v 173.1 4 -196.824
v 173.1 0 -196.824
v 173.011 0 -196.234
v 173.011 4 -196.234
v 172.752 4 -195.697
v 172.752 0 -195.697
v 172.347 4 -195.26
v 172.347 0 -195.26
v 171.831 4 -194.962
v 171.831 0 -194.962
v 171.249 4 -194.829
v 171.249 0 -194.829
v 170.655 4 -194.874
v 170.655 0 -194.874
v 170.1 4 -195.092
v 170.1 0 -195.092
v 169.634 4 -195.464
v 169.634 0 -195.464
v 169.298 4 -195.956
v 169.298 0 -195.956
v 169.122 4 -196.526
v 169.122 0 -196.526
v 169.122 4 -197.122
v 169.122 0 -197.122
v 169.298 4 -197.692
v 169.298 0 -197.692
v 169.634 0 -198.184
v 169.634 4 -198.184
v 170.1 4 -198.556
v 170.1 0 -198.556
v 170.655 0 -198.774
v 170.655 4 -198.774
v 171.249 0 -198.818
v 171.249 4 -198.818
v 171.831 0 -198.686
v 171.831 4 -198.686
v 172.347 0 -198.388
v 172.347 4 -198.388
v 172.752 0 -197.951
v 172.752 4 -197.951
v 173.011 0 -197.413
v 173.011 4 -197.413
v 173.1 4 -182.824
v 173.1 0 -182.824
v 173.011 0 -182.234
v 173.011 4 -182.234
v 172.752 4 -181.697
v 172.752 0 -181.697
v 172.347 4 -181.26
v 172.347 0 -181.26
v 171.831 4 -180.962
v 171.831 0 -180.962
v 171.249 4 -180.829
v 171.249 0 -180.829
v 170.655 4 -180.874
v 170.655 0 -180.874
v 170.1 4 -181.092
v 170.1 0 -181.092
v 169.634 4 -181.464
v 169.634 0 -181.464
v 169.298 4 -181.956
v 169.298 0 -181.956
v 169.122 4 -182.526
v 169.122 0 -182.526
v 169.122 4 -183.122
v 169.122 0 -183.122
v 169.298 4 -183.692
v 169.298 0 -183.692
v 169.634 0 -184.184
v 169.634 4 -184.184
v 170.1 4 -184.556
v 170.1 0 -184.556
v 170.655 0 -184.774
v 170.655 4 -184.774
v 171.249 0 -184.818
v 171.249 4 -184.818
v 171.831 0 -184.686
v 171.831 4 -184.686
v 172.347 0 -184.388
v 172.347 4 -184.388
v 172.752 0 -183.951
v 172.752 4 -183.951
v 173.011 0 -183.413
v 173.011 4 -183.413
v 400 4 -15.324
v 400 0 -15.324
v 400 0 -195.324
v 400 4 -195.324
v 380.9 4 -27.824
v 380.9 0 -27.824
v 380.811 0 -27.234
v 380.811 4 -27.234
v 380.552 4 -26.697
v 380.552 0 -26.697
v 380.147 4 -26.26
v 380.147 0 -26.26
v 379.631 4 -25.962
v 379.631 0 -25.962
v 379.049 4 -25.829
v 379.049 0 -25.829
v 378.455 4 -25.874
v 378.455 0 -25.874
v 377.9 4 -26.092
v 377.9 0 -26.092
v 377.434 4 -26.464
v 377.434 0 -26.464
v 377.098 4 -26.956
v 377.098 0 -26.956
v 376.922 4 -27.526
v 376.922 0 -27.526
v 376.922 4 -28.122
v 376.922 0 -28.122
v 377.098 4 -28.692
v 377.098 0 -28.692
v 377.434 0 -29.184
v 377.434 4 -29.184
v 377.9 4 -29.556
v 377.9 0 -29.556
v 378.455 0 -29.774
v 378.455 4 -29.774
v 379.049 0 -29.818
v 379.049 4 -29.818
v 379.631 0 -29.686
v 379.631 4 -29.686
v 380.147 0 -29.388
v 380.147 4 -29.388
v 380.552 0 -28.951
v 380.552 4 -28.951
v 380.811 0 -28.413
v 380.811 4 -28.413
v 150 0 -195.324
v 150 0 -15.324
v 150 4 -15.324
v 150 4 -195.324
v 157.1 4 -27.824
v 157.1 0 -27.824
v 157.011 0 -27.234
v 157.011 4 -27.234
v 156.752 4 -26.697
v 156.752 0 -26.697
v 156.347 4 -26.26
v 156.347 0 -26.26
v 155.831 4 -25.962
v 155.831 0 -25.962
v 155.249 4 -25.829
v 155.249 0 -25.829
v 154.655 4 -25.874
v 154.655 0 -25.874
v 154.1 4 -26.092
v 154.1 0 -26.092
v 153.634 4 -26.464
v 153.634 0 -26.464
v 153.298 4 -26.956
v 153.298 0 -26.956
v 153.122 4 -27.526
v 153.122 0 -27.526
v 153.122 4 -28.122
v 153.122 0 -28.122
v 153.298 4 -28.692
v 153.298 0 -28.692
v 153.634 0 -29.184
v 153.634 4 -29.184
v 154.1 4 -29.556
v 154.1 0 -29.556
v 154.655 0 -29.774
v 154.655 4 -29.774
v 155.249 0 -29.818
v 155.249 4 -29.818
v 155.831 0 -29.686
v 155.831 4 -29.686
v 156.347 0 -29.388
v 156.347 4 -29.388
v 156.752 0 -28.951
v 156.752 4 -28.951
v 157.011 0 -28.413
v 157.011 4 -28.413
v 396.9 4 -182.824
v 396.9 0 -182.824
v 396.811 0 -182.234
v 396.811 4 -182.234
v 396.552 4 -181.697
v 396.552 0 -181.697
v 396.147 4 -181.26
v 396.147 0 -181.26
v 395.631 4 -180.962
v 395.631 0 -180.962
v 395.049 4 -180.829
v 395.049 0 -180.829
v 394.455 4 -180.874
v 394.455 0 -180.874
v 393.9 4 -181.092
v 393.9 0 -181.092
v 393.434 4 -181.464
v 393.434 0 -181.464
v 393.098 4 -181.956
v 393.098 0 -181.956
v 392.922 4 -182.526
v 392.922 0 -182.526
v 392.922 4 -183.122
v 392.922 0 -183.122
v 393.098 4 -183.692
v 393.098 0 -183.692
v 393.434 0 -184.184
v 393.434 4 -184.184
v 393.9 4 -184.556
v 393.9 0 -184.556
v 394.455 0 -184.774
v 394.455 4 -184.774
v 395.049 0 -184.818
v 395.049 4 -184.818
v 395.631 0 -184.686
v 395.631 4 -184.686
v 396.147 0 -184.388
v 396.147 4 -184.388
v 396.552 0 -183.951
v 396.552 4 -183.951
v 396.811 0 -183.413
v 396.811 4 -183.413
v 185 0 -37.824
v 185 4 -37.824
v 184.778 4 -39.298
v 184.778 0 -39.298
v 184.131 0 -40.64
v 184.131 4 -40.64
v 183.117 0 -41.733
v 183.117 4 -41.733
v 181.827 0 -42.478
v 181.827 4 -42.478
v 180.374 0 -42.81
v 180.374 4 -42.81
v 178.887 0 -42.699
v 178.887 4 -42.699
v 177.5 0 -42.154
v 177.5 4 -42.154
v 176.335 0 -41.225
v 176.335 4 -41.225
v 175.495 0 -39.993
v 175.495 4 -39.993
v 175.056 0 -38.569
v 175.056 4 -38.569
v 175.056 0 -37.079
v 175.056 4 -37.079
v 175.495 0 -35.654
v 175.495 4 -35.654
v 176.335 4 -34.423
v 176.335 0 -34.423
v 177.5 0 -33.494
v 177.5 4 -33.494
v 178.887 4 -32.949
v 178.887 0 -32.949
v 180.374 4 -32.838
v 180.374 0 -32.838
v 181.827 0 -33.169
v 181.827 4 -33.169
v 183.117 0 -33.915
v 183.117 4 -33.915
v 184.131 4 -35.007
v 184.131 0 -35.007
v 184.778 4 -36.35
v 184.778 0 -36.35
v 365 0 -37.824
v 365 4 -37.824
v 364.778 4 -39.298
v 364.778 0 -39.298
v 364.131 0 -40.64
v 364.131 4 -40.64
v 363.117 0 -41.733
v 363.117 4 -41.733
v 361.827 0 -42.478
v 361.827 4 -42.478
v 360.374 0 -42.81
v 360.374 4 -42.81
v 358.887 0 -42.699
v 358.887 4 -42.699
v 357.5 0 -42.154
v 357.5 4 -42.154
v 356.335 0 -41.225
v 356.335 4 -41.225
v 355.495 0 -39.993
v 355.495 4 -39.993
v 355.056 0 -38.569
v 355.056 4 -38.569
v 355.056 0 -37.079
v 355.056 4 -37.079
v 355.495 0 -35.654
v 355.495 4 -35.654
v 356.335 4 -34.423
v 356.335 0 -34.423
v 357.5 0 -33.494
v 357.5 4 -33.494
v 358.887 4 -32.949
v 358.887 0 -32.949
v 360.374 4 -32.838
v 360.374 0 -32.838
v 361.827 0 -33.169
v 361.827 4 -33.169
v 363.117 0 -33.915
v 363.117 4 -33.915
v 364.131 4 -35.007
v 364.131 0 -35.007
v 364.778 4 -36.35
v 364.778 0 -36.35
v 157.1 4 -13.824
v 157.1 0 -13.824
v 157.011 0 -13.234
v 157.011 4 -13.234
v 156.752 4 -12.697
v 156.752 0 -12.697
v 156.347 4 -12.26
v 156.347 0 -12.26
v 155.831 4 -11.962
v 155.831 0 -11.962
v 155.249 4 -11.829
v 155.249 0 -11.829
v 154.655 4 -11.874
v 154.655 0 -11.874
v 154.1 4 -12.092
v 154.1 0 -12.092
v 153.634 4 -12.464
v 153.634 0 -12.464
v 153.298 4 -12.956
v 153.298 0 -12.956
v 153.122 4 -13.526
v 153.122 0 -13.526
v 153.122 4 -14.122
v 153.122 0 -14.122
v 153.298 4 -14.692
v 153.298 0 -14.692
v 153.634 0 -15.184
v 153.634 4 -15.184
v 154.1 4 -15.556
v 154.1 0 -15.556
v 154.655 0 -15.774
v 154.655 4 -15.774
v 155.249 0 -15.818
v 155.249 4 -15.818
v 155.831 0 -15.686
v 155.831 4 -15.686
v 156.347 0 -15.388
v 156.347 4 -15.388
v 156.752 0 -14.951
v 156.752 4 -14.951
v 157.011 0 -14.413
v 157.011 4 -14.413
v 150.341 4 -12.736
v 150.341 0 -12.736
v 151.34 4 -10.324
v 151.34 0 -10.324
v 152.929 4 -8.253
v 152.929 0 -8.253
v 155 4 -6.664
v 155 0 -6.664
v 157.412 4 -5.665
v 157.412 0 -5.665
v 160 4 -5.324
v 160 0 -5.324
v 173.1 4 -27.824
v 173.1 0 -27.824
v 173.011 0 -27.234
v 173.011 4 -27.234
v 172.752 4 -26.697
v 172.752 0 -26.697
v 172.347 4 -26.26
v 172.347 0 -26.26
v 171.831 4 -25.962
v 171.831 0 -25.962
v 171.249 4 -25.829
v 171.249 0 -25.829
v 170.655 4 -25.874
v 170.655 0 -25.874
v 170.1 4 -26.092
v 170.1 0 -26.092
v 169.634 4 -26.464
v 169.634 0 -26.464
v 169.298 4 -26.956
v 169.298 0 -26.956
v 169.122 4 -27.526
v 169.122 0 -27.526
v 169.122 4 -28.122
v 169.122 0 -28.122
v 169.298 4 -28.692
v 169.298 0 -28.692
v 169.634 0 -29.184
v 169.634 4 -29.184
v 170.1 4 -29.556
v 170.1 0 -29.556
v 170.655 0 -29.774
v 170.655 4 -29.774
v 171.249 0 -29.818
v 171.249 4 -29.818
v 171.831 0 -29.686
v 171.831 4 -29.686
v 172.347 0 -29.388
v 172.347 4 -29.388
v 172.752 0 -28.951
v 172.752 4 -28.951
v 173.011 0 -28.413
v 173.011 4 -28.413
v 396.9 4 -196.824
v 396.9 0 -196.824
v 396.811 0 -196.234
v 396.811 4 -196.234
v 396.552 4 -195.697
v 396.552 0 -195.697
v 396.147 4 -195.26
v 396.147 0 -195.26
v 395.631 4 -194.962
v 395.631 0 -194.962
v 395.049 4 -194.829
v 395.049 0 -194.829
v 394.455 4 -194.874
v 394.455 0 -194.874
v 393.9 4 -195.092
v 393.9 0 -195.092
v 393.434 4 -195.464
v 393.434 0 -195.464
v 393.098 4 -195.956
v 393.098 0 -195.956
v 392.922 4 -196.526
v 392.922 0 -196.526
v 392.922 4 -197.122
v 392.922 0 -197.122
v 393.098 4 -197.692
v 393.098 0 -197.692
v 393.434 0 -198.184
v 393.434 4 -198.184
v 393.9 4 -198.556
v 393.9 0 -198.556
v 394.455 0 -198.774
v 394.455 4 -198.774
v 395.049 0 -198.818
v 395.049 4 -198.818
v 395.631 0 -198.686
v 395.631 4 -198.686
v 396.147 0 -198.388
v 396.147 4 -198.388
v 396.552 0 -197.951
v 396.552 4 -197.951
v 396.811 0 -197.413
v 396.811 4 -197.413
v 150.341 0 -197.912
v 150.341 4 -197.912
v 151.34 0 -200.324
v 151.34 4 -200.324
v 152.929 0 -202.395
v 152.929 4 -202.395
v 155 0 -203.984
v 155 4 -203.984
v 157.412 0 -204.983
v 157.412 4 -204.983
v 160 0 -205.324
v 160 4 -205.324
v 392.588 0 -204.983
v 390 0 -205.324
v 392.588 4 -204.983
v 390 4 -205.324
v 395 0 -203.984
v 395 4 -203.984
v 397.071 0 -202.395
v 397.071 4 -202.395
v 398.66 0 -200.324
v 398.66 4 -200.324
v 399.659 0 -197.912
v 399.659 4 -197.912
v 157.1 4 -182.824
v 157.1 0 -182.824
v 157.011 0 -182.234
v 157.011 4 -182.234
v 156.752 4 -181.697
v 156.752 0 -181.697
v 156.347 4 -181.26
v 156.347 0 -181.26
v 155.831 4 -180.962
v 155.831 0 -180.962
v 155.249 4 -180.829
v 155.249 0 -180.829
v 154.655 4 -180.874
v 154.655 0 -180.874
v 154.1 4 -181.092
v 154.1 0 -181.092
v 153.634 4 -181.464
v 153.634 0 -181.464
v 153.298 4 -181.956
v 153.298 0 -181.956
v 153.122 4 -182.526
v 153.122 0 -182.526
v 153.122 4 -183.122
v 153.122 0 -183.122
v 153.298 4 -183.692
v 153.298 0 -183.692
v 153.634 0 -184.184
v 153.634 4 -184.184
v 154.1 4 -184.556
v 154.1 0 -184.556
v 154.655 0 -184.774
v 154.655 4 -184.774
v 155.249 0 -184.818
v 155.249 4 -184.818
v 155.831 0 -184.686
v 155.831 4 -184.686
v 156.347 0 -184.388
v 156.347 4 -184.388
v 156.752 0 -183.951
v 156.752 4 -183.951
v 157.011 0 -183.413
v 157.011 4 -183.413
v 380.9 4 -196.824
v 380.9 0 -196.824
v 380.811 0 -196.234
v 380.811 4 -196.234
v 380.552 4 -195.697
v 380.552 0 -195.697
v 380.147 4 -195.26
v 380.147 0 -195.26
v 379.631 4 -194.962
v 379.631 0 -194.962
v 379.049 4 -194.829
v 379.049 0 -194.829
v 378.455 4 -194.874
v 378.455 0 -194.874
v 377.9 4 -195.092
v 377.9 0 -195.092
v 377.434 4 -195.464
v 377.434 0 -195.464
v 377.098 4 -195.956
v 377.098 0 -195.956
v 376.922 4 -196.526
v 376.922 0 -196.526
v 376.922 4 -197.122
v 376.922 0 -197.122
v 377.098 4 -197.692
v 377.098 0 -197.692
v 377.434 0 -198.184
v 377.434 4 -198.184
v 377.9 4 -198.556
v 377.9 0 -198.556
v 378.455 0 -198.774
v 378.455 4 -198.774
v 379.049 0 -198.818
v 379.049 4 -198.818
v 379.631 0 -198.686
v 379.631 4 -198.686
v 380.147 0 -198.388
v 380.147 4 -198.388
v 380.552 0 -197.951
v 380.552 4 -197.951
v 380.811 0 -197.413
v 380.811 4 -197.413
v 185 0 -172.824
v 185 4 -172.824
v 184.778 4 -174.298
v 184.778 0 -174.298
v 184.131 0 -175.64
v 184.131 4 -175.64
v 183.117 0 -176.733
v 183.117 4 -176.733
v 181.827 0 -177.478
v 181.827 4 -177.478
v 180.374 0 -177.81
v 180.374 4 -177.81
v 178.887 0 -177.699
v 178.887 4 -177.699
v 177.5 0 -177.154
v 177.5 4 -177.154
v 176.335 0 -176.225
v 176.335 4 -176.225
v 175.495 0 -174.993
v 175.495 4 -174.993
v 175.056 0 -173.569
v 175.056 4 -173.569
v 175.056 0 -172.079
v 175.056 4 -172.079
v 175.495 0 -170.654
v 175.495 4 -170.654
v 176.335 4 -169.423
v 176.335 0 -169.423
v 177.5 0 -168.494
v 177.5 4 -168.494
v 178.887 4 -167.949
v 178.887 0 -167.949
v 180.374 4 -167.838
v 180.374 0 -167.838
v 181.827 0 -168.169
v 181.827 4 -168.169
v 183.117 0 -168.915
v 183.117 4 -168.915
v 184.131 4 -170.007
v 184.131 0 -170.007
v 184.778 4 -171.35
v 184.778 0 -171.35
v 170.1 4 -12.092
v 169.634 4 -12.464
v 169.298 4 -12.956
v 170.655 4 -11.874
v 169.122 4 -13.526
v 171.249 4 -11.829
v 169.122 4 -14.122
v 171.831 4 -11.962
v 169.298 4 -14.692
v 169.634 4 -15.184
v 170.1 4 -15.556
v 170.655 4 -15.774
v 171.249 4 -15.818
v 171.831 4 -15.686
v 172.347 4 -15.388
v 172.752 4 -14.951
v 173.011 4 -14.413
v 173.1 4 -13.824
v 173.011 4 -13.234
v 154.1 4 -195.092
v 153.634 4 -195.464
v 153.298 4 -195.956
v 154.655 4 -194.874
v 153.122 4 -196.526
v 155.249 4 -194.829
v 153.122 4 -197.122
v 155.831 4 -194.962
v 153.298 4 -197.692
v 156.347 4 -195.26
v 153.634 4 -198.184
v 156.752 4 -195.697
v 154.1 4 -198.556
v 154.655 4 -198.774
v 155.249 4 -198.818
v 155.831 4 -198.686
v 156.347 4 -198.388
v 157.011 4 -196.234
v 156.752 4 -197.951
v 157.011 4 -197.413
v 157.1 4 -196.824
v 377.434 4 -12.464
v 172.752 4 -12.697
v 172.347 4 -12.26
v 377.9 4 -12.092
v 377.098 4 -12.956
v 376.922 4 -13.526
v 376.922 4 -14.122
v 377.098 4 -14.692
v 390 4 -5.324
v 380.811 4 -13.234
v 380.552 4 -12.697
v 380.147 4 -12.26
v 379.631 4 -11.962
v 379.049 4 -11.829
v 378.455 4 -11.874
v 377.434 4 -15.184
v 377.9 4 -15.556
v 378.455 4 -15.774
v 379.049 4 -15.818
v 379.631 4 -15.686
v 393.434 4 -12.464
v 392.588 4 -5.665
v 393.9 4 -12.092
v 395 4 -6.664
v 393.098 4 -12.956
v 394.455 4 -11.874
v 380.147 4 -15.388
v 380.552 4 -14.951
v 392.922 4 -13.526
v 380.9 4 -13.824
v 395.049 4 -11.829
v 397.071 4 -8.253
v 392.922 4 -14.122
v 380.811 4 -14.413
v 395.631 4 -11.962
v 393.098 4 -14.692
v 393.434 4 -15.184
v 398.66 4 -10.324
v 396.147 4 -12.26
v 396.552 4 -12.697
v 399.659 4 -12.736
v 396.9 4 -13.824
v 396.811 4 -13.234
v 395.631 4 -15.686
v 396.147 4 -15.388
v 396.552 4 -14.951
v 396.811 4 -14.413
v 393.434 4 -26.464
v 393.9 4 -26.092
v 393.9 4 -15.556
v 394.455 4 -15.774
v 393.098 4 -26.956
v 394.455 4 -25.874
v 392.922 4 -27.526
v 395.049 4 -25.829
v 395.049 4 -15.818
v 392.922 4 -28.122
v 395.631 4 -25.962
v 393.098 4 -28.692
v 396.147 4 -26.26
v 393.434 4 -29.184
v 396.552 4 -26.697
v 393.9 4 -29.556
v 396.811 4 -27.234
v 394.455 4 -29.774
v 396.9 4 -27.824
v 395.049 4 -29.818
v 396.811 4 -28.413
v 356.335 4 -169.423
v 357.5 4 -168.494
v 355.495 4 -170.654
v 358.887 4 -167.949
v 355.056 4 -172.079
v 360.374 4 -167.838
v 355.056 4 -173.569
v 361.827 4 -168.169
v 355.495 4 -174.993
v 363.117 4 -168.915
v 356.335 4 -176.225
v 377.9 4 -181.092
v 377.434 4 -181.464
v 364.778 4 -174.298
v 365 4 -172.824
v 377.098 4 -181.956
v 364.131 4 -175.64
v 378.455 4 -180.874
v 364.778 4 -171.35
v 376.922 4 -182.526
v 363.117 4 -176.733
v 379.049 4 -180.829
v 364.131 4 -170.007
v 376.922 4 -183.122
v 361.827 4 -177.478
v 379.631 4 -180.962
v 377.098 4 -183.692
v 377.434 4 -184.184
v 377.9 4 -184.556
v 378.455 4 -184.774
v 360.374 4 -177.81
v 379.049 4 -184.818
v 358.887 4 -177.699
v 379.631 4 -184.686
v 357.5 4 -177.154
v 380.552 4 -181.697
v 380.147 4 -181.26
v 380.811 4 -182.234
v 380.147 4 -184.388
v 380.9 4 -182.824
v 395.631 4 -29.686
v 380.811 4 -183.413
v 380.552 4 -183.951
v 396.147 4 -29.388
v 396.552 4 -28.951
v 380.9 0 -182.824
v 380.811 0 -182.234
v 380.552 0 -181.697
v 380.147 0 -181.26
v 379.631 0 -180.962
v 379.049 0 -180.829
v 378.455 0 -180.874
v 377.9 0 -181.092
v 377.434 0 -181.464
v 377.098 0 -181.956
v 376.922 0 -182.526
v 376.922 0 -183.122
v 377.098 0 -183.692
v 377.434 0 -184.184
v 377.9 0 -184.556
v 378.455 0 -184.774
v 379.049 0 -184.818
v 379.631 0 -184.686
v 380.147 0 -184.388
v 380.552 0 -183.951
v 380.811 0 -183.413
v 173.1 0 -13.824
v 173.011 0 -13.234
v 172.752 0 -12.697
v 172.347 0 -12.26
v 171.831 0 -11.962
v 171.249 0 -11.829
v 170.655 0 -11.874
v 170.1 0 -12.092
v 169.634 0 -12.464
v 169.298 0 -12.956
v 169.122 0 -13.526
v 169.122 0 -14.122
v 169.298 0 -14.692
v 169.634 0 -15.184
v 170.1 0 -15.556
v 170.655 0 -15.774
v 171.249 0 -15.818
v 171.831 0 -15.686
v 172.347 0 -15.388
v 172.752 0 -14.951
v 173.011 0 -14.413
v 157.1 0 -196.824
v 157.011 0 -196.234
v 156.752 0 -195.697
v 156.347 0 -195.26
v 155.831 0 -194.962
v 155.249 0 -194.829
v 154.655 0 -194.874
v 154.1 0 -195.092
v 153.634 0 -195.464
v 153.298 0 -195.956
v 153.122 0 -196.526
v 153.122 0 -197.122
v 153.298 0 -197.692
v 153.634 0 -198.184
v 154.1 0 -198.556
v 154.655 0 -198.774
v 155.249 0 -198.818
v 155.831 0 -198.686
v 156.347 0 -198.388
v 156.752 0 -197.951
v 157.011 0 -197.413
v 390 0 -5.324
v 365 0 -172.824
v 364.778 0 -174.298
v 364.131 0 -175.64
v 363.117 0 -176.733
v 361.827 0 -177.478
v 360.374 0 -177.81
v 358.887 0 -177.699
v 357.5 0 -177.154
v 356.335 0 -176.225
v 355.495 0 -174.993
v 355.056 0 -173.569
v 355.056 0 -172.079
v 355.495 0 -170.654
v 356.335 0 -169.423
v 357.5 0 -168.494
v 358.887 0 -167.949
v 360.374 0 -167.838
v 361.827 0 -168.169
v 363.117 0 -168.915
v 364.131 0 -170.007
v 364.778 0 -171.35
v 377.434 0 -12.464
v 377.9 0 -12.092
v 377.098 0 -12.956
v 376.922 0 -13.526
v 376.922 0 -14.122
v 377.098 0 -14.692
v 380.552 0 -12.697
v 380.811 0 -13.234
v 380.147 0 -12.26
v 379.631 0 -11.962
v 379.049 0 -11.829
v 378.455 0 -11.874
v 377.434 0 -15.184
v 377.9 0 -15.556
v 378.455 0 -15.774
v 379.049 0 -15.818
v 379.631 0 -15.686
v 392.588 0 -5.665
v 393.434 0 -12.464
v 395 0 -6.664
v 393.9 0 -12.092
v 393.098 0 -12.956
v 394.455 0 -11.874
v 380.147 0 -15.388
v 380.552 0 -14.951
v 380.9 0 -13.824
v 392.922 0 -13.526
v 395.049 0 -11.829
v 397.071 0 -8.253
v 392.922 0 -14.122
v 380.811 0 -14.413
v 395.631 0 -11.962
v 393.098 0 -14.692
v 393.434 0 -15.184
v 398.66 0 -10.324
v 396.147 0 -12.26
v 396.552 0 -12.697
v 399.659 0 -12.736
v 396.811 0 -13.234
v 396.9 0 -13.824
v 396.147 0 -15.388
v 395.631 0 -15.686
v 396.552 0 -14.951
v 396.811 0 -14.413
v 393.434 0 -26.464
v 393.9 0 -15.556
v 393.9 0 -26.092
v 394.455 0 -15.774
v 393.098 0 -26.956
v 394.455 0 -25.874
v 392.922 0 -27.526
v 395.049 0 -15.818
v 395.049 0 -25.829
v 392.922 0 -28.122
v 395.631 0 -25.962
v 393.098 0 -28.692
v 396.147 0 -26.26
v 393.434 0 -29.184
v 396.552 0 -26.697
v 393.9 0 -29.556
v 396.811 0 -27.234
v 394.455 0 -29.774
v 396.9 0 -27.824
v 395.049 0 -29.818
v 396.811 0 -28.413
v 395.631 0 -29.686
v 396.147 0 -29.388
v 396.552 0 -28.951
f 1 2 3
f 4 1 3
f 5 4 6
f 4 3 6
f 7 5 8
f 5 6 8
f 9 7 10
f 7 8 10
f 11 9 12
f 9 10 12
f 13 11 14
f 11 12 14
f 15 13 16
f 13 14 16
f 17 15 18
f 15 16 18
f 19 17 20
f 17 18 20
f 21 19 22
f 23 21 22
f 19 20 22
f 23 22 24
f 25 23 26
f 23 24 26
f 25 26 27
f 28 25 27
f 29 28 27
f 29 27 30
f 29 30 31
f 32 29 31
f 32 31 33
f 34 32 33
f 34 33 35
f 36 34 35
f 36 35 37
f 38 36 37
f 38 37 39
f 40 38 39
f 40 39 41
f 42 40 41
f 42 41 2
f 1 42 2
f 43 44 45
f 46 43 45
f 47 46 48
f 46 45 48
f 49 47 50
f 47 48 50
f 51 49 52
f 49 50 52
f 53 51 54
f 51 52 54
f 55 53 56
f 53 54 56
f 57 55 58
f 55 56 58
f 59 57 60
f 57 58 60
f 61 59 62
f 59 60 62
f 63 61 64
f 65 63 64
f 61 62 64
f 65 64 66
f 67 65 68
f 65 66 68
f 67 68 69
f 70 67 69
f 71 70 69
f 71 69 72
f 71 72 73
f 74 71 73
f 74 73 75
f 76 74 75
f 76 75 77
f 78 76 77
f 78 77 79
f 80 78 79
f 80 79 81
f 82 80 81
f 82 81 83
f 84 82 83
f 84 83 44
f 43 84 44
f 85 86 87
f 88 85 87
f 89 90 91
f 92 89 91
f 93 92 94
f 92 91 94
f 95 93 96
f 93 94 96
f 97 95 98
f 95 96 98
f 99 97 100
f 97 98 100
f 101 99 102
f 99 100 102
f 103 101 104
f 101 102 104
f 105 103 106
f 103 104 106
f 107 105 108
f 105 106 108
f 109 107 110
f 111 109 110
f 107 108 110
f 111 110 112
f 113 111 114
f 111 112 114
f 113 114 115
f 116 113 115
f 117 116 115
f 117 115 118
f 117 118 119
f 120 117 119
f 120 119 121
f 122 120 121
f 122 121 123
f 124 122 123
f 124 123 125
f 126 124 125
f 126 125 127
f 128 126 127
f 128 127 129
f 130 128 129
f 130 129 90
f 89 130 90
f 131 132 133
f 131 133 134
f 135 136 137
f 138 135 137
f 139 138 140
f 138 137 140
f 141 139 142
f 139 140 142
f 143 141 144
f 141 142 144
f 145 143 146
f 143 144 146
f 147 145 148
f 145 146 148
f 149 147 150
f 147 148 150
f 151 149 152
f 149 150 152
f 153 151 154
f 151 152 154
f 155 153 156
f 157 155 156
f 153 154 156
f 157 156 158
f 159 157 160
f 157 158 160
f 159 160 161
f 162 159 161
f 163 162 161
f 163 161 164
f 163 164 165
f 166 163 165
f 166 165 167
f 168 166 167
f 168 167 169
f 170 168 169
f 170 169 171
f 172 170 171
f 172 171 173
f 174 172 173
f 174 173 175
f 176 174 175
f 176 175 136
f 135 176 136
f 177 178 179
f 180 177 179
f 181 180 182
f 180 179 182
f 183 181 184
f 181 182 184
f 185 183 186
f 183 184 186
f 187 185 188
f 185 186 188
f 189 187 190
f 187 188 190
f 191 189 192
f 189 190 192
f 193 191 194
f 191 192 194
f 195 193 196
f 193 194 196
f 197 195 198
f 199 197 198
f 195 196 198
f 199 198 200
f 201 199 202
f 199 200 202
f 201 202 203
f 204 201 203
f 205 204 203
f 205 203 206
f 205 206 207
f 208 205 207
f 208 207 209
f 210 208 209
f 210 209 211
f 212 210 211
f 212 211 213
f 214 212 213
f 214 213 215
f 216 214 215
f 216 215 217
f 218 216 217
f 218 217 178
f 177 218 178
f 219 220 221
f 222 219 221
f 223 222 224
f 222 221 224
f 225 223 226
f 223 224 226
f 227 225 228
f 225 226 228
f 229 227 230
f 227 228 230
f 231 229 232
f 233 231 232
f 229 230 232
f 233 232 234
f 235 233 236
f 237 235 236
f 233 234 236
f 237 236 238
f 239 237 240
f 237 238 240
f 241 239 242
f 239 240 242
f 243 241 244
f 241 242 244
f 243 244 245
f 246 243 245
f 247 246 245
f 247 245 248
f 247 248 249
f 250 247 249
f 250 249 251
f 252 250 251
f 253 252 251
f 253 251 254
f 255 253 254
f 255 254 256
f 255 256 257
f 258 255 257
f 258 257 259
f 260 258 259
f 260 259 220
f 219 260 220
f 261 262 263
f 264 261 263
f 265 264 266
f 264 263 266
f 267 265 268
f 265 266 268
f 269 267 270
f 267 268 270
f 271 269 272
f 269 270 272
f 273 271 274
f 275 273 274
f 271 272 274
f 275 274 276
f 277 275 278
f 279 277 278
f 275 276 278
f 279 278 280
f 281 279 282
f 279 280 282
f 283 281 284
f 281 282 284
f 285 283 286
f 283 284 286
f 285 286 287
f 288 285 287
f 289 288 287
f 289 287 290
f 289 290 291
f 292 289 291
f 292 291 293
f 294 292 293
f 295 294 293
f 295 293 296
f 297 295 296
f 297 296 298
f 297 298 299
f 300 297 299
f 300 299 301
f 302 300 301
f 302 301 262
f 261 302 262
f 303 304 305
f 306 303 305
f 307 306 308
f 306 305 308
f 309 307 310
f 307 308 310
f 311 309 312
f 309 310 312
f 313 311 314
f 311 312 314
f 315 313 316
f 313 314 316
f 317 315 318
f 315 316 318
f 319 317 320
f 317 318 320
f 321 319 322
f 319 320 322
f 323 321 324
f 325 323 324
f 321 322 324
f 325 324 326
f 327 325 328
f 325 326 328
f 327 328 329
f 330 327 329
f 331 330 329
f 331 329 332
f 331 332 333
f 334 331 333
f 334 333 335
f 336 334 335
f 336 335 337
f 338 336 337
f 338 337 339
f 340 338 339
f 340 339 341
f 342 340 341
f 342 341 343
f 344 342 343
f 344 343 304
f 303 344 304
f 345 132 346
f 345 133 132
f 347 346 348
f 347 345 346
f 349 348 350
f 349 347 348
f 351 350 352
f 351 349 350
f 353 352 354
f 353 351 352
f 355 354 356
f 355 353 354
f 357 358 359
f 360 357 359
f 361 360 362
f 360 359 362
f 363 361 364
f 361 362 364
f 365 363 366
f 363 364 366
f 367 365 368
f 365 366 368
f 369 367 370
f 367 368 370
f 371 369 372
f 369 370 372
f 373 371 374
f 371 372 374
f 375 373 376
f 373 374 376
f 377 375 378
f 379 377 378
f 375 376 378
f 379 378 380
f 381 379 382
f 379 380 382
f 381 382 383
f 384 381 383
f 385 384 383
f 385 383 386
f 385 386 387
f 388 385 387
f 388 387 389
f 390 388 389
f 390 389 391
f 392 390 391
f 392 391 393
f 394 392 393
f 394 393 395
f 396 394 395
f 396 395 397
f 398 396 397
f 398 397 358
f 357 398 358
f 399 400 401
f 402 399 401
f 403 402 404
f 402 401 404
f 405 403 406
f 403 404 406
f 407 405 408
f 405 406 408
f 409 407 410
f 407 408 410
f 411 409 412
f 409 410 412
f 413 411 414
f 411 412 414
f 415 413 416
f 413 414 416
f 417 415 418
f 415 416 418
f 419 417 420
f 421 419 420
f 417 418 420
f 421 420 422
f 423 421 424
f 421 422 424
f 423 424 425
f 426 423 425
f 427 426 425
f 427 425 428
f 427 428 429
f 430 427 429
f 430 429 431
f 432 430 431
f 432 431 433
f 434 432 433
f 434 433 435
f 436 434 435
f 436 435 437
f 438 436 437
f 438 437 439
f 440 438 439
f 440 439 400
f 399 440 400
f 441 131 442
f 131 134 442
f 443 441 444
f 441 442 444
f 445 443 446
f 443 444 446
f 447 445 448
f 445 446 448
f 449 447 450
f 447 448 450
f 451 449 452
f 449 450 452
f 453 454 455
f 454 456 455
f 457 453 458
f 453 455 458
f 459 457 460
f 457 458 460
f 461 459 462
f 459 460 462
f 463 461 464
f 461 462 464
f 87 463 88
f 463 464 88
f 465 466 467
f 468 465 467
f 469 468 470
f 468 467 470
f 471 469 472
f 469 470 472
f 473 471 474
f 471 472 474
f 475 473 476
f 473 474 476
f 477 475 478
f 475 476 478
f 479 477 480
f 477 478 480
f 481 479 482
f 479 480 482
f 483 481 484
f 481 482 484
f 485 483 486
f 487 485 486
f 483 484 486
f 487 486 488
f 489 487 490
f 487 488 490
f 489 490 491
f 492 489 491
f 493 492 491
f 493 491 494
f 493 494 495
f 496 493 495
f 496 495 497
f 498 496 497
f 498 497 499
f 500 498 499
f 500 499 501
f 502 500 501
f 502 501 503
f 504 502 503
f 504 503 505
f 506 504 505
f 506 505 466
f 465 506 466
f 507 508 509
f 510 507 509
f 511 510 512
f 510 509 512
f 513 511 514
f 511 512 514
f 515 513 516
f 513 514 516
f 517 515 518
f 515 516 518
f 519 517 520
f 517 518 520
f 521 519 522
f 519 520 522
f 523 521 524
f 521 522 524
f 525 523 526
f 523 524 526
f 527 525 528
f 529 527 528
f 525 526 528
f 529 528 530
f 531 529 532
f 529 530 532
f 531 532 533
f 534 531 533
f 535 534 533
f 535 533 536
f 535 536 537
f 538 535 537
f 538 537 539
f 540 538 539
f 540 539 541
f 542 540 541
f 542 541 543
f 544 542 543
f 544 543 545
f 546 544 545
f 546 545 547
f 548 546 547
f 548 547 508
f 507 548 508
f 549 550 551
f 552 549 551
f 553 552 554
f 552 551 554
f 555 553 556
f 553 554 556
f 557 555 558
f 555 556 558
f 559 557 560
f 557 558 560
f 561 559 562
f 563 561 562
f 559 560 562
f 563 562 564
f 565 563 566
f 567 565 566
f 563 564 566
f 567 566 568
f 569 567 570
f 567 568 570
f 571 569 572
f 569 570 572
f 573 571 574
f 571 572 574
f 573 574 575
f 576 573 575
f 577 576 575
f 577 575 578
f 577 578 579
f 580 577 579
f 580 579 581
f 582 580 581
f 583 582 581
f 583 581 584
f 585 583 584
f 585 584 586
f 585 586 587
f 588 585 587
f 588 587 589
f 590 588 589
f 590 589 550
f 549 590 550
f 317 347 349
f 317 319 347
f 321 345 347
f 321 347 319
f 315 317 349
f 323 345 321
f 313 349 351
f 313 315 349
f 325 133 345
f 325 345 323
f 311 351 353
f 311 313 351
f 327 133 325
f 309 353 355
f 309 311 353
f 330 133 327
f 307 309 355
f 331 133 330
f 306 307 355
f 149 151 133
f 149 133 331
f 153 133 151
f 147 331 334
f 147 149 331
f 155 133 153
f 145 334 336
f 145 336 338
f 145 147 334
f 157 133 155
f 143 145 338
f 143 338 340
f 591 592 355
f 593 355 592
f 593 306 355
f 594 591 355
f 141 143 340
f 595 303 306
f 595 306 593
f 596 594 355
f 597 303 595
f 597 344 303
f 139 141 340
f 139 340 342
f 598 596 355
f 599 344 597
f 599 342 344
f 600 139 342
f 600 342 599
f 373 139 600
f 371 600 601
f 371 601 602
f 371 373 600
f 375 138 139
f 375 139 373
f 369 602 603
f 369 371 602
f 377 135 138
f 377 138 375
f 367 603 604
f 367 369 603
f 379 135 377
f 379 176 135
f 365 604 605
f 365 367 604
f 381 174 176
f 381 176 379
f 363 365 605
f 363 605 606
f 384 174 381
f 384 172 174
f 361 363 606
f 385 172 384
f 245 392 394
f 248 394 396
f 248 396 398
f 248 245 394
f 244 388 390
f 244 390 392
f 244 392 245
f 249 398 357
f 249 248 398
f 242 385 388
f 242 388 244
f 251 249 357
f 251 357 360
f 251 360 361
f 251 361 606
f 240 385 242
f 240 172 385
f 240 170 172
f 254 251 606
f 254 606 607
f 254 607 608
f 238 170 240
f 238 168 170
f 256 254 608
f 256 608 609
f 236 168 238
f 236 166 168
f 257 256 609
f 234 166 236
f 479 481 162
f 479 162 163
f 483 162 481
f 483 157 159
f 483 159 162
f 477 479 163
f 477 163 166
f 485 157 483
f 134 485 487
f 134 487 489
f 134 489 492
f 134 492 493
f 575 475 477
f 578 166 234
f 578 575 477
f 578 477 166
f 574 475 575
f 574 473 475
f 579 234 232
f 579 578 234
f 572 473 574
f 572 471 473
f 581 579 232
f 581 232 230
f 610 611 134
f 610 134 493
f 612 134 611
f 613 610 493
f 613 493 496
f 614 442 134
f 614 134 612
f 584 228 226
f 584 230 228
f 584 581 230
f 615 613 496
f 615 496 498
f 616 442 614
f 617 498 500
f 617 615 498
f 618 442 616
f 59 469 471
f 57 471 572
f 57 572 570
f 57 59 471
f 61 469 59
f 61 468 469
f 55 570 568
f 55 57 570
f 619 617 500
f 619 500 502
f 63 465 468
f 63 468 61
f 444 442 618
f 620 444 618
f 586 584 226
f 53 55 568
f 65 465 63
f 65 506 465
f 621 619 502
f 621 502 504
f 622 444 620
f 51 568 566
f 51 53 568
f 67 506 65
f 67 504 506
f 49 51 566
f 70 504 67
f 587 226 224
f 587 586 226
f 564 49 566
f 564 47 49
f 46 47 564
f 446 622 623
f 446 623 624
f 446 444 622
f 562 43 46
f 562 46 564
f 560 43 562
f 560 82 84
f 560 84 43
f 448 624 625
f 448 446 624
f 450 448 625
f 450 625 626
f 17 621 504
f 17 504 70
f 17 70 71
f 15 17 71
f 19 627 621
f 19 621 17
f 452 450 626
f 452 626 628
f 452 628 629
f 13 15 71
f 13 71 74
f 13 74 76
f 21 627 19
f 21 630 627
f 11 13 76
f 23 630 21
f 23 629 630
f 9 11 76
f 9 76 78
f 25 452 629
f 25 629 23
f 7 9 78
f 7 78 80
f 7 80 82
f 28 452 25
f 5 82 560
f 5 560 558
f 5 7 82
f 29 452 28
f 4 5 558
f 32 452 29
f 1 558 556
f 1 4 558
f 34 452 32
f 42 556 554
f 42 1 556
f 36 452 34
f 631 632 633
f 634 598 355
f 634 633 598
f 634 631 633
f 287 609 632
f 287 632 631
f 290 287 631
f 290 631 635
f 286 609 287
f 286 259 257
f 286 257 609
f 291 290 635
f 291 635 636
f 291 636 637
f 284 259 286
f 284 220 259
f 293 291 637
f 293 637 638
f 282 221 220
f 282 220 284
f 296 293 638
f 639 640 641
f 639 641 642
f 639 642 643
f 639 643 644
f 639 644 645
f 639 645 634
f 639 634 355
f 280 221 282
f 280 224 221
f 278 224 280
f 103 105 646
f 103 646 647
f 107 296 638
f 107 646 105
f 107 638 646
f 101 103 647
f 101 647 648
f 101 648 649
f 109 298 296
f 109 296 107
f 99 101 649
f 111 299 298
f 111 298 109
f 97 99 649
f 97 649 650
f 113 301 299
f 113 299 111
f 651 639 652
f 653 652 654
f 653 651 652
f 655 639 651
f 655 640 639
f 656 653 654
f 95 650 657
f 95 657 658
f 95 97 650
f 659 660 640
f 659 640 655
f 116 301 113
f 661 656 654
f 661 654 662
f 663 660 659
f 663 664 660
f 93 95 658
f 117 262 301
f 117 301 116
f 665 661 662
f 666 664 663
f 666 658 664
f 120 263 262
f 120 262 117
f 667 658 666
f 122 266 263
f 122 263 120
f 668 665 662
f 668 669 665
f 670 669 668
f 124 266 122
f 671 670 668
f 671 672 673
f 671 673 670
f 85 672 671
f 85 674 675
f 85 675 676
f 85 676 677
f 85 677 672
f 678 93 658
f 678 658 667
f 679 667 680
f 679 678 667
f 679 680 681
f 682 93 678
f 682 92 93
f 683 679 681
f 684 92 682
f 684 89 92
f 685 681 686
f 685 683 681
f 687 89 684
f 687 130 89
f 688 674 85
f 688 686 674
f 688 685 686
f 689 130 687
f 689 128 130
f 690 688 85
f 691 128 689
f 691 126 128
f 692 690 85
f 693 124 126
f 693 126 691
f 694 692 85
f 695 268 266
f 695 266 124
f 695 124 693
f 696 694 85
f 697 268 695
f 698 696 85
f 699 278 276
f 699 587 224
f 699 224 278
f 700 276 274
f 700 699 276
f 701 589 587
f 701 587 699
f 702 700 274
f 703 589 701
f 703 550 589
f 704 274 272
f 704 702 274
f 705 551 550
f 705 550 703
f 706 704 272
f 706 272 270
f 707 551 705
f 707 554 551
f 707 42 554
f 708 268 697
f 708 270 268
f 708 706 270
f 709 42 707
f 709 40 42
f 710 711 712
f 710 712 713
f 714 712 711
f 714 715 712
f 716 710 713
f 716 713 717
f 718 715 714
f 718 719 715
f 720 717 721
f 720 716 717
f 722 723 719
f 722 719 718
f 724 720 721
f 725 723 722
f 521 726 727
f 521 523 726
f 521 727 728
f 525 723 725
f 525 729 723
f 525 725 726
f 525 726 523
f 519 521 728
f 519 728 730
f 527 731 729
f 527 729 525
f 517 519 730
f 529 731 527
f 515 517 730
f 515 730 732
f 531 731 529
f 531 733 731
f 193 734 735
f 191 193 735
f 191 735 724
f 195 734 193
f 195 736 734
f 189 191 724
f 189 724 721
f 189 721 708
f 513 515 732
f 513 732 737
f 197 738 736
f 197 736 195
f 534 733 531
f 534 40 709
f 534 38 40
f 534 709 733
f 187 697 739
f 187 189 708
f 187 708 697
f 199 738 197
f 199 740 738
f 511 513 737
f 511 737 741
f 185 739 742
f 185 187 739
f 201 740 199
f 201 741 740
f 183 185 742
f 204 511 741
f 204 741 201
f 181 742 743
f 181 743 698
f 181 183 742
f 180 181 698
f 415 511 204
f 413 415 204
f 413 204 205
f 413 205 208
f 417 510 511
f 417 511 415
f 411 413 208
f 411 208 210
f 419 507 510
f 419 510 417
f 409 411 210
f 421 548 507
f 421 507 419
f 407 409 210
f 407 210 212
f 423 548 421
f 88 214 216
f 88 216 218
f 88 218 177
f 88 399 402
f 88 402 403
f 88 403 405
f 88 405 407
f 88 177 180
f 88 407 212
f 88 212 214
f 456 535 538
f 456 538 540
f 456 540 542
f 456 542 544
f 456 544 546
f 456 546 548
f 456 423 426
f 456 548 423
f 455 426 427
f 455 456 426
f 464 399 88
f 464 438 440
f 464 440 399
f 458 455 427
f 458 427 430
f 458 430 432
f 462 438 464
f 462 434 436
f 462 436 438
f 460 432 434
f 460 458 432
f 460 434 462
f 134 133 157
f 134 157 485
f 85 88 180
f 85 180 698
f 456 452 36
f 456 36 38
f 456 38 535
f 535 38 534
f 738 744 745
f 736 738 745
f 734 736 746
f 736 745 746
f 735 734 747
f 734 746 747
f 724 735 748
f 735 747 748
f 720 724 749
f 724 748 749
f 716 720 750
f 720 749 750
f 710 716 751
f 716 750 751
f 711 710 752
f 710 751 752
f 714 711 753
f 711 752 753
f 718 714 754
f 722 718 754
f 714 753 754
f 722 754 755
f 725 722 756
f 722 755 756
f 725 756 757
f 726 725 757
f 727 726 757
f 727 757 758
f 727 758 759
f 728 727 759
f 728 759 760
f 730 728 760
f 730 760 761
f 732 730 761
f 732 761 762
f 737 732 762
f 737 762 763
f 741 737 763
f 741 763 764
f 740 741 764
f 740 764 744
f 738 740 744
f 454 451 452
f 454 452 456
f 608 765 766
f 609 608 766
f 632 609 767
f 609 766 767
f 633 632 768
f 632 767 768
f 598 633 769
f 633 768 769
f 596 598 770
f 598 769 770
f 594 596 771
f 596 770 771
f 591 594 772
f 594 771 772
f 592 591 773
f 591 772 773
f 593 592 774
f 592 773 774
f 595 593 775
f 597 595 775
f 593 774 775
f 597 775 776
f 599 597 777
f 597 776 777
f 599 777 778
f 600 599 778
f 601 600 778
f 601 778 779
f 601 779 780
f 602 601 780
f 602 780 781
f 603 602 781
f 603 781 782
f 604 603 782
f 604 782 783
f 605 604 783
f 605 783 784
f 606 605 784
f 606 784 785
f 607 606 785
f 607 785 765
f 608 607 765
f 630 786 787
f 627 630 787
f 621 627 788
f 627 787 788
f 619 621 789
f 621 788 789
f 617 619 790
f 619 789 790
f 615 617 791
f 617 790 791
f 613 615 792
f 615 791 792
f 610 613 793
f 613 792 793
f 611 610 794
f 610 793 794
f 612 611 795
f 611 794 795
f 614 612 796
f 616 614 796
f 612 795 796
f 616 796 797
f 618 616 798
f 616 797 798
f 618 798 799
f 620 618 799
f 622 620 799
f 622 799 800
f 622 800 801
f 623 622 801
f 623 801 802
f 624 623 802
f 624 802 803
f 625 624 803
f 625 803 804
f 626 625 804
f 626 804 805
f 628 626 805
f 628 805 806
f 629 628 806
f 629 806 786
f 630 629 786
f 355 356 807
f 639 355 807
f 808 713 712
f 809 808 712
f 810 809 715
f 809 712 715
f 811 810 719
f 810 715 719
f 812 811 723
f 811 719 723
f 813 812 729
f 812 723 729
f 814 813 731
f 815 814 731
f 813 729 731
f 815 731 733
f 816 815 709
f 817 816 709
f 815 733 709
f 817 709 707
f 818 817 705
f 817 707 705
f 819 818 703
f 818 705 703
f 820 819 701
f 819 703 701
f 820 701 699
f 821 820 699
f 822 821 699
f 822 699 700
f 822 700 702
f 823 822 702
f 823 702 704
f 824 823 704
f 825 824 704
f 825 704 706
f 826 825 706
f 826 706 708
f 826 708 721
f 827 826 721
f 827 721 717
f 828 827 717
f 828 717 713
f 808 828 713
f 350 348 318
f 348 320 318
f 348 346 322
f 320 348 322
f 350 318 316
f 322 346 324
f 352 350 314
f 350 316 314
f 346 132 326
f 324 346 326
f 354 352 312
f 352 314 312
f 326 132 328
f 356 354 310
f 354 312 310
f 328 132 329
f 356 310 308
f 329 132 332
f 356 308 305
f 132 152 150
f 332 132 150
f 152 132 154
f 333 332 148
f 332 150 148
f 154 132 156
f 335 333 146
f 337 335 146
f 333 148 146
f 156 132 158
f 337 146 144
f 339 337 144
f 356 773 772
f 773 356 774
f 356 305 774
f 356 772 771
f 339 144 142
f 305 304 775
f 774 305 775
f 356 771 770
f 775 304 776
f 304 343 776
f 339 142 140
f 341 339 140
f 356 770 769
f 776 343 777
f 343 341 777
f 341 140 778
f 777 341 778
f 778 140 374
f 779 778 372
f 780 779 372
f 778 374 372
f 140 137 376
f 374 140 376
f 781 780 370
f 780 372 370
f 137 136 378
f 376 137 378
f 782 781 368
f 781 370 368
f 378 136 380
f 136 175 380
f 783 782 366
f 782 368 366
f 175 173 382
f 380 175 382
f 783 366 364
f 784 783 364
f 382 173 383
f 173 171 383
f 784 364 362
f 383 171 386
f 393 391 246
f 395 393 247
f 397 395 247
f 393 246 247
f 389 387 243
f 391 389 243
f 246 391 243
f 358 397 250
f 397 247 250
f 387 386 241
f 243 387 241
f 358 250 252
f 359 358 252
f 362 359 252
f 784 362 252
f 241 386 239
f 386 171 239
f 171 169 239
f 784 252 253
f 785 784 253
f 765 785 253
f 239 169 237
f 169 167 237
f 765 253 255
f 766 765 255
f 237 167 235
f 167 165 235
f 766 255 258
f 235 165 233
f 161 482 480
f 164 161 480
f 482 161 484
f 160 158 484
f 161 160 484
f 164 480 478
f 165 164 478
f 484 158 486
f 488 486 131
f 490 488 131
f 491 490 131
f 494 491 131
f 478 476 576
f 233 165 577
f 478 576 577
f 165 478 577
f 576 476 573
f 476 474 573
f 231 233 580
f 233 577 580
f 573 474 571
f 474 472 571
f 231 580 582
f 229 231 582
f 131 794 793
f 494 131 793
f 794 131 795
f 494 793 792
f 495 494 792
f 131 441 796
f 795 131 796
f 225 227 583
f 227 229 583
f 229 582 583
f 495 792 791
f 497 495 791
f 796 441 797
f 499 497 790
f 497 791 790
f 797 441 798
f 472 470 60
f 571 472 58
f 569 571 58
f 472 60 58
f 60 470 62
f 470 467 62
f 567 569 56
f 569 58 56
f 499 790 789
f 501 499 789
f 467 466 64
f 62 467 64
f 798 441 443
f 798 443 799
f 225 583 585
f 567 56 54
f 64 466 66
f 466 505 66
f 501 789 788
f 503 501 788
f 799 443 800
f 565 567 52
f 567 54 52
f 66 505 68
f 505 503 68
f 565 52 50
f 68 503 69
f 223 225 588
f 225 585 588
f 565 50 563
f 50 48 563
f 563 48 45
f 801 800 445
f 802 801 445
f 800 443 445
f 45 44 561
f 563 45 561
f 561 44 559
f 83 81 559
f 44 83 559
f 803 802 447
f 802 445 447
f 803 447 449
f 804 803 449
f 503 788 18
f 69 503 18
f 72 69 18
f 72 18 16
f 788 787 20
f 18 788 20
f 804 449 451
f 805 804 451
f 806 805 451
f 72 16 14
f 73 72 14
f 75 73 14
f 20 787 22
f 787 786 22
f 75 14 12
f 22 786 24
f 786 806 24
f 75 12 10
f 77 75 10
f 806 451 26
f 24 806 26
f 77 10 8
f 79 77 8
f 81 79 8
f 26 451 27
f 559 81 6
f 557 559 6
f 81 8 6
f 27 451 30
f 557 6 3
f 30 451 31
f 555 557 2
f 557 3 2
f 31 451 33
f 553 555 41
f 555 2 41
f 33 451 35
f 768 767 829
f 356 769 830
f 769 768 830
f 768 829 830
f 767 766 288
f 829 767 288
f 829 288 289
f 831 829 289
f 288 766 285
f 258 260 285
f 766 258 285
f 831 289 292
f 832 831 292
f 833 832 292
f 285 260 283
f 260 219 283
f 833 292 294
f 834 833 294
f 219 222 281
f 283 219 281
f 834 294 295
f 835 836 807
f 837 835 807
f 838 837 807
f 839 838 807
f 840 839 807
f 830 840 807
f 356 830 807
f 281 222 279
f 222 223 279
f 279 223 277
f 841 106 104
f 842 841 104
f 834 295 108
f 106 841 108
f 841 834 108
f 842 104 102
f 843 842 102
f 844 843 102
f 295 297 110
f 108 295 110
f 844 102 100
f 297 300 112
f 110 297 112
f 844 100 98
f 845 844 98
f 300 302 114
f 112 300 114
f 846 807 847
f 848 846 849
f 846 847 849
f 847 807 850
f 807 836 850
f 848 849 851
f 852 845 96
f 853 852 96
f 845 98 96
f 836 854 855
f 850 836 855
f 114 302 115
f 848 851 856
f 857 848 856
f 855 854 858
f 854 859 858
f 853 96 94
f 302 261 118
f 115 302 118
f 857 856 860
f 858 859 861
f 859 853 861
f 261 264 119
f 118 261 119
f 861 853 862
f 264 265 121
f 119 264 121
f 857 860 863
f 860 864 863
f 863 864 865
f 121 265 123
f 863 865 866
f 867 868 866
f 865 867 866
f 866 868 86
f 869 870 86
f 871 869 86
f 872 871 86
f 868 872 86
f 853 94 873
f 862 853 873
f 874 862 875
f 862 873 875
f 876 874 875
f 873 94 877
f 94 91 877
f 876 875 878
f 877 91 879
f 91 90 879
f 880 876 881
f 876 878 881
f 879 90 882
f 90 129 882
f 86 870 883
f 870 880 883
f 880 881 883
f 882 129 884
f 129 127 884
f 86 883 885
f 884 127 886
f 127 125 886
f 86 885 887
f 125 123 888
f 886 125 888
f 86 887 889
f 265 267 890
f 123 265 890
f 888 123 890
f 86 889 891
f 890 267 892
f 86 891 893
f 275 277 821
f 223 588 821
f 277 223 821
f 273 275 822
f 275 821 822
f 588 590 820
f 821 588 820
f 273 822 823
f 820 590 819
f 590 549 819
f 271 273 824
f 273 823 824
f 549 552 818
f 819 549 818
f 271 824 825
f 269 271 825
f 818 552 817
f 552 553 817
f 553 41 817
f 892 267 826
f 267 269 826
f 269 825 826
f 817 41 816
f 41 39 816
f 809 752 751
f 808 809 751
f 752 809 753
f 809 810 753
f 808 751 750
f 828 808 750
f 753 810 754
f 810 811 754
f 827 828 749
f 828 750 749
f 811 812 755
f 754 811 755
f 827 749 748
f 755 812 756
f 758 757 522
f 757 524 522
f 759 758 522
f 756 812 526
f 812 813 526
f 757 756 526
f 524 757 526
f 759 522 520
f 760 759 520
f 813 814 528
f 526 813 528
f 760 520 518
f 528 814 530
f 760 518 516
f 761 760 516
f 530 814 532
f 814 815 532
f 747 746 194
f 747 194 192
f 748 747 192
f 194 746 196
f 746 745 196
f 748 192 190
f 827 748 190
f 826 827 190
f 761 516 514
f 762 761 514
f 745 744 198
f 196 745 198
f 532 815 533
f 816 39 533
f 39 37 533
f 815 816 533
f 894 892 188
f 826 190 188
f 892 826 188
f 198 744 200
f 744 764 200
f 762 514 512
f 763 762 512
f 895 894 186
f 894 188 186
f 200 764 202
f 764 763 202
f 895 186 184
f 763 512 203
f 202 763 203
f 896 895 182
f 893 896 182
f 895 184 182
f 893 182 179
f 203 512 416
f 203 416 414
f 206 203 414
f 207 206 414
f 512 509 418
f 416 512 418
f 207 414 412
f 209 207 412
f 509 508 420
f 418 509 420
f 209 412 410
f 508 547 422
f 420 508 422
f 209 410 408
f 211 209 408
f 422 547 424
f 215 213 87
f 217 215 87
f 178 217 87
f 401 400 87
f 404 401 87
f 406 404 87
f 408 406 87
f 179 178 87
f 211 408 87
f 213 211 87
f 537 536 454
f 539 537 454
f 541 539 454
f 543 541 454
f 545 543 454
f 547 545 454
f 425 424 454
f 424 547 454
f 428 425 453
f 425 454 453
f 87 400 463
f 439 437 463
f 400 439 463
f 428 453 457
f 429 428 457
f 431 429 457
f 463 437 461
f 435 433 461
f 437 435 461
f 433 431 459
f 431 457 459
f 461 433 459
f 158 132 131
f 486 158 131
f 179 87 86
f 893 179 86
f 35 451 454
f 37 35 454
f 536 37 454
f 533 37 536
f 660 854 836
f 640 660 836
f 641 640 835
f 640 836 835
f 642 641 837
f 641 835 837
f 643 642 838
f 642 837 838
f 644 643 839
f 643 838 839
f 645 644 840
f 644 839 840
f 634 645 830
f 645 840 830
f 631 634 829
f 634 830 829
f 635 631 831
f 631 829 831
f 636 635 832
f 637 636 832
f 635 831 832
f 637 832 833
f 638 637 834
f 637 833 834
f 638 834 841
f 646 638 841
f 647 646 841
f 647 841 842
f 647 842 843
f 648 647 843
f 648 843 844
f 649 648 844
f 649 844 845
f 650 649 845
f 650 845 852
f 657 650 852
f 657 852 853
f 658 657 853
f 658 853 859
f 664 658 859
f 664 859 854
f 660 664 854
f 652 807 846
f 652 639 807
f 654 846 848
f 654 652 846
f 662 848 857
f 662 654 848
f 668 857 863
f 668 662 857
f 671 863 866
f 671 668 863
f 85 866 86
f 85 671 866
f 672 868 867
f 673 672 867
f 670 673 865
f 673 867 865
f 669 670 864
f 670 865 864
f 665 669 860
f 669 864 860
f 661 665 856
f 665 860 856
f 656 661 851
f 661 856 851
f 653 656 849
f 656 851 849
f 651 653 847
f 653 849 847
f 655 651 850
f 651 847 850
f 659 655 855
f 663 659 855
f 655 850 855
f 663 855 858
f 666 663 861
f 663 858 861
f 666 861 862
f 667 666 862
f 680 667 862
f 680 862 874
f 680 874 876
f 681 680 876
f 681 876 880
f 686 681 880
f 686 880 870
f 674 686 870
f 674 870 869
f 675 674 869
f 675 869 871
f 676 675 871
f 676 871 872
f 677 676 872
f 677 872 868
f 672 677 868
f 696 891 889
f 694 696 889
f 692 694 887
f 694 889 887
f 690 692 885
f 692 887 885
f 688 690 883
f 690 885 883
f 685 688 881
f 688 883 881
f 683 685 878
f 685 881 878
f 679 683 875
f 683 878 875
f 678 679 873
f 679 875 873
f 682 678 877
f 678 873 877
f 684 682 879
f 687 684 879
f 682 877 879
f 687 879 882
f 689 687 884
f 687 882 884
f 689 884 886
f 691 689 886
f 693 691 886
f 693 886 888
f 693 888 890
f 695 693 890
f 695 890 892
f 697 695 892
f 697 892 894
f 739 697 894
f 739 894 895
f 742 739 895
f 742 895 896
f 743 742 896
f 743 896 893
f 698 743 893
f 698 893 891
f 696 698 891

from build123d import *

# Parameters (mm, degrees)
SKETCH1_W           = 250
SKETCH1_H           = 200
BOSS_EXTRUDE1_DEPTH = 4
SKETCH4_R           = 5
CUT_EXTRUDE1_DEPTH  = 5
SKETCH9_R           = 2
CUT_EXTRUDE5_DEPTH  = 5
FILLET1_R           = 10


with BuildPart() as part:
    # Sketch1 → Boss-Extrude1 (new body)
    with BuildSketch(Plane(origin=(0, 0, 0), x_dir=(1, 0, 0), z_dir=(0, 1, 0))):
        with Locations((275, 105.323868678)):
            Rectangle(SKETCH1_W, SKETCH1_H)
    extrude(amount=BOSS_EXTRUDE1_DEPTH)

    # Sketch4 → Cut-Extrude1 (cut, through all)
    with BuildSketch(Plane(origin=(0, 4, 0), x_dir=(1, 0, 0), z_dir=(0, 1, 0))):
        with Locations((360, 37.823868678)):
            Circle(SKETCH4_R)
        with Locations((180, 37.823868678)):
            Circle(SKETCH4_R)
        with Locations((360, 172.823868678)):
            Circle(SKETCH4_R)
        with Locations((180, 172.823868678)):
            Circle(SKETCH4_R)
    extrude(amount=-CUT_EXTRUDE1_DEPTH, mode=Mode.SUBTRACT)

    # Sketch9 → Cut-Extrude5 (cut, through all)
    with BuildSketch(Plane.XZ):
        with Locations((155.1, -196.823868678)):
            Circle(SKETCH9_R)
        with Locations((155.1, -182.823868678)):
            Circle(SKETCH9_R)
        with Locations((171.1, -196.823868678)):
            Circle(SKETCH9_R)
        with Locations((171.1, -182.823868678)):
            Circle(SKETCH9_R)
        with Locations((155.1, -27.823868678)):
            Circle(SKETCH9_R)
        with Locations((155.1, -13.823868678)):
            Circle(SKETCH9_R)
        with Locations((171.1, -13.823868678)):
            Circle(SKETCH9_R)
        with Locations((171.1, -27.823868678)):
            Circle(SKETCH9_R)
        with Locations((394.9, -182.823868678)):
            Circle(SKETCH9_R)
        with Locations((394.9, -196.823868678)):
            Circle(SKETCH9_R)
        with Locations((378.9, -196.823868678)):
            Circle(SKETCH9_R)
        with Locations((378.9, -182.823868678)):
            Circle(SKETCH9_R)
        with Locations((394.9, -27.823868678)):
            Circle(SKETCH9_R)
        with Locations((378.9, -27.823868678)):
            Circle(SKETCH9_R)
        with Locations((378.9, -13.823868678)):
            Circle(SKETCH9_R)
        with Locations((394.9, -13.823868678)):
            Circle(SKETCH9_R)
    extrude(amount=-CUT_EXTRUDE5_DEPTH, mode=Mode.SUBTRACT)

    # Fillet1
    fillet1_edges = [part.edges().sort_by_distance(p)[0] for p in [
        (150, 2, -205.323868678),
        (400, 2, -205.323868678),
        (400, 2, -5.323868678),
        (150, 2, -5.323868678),
    ]]
    fillet(fillet1_edges, radius=FILLET1_R)


solid = part.part
